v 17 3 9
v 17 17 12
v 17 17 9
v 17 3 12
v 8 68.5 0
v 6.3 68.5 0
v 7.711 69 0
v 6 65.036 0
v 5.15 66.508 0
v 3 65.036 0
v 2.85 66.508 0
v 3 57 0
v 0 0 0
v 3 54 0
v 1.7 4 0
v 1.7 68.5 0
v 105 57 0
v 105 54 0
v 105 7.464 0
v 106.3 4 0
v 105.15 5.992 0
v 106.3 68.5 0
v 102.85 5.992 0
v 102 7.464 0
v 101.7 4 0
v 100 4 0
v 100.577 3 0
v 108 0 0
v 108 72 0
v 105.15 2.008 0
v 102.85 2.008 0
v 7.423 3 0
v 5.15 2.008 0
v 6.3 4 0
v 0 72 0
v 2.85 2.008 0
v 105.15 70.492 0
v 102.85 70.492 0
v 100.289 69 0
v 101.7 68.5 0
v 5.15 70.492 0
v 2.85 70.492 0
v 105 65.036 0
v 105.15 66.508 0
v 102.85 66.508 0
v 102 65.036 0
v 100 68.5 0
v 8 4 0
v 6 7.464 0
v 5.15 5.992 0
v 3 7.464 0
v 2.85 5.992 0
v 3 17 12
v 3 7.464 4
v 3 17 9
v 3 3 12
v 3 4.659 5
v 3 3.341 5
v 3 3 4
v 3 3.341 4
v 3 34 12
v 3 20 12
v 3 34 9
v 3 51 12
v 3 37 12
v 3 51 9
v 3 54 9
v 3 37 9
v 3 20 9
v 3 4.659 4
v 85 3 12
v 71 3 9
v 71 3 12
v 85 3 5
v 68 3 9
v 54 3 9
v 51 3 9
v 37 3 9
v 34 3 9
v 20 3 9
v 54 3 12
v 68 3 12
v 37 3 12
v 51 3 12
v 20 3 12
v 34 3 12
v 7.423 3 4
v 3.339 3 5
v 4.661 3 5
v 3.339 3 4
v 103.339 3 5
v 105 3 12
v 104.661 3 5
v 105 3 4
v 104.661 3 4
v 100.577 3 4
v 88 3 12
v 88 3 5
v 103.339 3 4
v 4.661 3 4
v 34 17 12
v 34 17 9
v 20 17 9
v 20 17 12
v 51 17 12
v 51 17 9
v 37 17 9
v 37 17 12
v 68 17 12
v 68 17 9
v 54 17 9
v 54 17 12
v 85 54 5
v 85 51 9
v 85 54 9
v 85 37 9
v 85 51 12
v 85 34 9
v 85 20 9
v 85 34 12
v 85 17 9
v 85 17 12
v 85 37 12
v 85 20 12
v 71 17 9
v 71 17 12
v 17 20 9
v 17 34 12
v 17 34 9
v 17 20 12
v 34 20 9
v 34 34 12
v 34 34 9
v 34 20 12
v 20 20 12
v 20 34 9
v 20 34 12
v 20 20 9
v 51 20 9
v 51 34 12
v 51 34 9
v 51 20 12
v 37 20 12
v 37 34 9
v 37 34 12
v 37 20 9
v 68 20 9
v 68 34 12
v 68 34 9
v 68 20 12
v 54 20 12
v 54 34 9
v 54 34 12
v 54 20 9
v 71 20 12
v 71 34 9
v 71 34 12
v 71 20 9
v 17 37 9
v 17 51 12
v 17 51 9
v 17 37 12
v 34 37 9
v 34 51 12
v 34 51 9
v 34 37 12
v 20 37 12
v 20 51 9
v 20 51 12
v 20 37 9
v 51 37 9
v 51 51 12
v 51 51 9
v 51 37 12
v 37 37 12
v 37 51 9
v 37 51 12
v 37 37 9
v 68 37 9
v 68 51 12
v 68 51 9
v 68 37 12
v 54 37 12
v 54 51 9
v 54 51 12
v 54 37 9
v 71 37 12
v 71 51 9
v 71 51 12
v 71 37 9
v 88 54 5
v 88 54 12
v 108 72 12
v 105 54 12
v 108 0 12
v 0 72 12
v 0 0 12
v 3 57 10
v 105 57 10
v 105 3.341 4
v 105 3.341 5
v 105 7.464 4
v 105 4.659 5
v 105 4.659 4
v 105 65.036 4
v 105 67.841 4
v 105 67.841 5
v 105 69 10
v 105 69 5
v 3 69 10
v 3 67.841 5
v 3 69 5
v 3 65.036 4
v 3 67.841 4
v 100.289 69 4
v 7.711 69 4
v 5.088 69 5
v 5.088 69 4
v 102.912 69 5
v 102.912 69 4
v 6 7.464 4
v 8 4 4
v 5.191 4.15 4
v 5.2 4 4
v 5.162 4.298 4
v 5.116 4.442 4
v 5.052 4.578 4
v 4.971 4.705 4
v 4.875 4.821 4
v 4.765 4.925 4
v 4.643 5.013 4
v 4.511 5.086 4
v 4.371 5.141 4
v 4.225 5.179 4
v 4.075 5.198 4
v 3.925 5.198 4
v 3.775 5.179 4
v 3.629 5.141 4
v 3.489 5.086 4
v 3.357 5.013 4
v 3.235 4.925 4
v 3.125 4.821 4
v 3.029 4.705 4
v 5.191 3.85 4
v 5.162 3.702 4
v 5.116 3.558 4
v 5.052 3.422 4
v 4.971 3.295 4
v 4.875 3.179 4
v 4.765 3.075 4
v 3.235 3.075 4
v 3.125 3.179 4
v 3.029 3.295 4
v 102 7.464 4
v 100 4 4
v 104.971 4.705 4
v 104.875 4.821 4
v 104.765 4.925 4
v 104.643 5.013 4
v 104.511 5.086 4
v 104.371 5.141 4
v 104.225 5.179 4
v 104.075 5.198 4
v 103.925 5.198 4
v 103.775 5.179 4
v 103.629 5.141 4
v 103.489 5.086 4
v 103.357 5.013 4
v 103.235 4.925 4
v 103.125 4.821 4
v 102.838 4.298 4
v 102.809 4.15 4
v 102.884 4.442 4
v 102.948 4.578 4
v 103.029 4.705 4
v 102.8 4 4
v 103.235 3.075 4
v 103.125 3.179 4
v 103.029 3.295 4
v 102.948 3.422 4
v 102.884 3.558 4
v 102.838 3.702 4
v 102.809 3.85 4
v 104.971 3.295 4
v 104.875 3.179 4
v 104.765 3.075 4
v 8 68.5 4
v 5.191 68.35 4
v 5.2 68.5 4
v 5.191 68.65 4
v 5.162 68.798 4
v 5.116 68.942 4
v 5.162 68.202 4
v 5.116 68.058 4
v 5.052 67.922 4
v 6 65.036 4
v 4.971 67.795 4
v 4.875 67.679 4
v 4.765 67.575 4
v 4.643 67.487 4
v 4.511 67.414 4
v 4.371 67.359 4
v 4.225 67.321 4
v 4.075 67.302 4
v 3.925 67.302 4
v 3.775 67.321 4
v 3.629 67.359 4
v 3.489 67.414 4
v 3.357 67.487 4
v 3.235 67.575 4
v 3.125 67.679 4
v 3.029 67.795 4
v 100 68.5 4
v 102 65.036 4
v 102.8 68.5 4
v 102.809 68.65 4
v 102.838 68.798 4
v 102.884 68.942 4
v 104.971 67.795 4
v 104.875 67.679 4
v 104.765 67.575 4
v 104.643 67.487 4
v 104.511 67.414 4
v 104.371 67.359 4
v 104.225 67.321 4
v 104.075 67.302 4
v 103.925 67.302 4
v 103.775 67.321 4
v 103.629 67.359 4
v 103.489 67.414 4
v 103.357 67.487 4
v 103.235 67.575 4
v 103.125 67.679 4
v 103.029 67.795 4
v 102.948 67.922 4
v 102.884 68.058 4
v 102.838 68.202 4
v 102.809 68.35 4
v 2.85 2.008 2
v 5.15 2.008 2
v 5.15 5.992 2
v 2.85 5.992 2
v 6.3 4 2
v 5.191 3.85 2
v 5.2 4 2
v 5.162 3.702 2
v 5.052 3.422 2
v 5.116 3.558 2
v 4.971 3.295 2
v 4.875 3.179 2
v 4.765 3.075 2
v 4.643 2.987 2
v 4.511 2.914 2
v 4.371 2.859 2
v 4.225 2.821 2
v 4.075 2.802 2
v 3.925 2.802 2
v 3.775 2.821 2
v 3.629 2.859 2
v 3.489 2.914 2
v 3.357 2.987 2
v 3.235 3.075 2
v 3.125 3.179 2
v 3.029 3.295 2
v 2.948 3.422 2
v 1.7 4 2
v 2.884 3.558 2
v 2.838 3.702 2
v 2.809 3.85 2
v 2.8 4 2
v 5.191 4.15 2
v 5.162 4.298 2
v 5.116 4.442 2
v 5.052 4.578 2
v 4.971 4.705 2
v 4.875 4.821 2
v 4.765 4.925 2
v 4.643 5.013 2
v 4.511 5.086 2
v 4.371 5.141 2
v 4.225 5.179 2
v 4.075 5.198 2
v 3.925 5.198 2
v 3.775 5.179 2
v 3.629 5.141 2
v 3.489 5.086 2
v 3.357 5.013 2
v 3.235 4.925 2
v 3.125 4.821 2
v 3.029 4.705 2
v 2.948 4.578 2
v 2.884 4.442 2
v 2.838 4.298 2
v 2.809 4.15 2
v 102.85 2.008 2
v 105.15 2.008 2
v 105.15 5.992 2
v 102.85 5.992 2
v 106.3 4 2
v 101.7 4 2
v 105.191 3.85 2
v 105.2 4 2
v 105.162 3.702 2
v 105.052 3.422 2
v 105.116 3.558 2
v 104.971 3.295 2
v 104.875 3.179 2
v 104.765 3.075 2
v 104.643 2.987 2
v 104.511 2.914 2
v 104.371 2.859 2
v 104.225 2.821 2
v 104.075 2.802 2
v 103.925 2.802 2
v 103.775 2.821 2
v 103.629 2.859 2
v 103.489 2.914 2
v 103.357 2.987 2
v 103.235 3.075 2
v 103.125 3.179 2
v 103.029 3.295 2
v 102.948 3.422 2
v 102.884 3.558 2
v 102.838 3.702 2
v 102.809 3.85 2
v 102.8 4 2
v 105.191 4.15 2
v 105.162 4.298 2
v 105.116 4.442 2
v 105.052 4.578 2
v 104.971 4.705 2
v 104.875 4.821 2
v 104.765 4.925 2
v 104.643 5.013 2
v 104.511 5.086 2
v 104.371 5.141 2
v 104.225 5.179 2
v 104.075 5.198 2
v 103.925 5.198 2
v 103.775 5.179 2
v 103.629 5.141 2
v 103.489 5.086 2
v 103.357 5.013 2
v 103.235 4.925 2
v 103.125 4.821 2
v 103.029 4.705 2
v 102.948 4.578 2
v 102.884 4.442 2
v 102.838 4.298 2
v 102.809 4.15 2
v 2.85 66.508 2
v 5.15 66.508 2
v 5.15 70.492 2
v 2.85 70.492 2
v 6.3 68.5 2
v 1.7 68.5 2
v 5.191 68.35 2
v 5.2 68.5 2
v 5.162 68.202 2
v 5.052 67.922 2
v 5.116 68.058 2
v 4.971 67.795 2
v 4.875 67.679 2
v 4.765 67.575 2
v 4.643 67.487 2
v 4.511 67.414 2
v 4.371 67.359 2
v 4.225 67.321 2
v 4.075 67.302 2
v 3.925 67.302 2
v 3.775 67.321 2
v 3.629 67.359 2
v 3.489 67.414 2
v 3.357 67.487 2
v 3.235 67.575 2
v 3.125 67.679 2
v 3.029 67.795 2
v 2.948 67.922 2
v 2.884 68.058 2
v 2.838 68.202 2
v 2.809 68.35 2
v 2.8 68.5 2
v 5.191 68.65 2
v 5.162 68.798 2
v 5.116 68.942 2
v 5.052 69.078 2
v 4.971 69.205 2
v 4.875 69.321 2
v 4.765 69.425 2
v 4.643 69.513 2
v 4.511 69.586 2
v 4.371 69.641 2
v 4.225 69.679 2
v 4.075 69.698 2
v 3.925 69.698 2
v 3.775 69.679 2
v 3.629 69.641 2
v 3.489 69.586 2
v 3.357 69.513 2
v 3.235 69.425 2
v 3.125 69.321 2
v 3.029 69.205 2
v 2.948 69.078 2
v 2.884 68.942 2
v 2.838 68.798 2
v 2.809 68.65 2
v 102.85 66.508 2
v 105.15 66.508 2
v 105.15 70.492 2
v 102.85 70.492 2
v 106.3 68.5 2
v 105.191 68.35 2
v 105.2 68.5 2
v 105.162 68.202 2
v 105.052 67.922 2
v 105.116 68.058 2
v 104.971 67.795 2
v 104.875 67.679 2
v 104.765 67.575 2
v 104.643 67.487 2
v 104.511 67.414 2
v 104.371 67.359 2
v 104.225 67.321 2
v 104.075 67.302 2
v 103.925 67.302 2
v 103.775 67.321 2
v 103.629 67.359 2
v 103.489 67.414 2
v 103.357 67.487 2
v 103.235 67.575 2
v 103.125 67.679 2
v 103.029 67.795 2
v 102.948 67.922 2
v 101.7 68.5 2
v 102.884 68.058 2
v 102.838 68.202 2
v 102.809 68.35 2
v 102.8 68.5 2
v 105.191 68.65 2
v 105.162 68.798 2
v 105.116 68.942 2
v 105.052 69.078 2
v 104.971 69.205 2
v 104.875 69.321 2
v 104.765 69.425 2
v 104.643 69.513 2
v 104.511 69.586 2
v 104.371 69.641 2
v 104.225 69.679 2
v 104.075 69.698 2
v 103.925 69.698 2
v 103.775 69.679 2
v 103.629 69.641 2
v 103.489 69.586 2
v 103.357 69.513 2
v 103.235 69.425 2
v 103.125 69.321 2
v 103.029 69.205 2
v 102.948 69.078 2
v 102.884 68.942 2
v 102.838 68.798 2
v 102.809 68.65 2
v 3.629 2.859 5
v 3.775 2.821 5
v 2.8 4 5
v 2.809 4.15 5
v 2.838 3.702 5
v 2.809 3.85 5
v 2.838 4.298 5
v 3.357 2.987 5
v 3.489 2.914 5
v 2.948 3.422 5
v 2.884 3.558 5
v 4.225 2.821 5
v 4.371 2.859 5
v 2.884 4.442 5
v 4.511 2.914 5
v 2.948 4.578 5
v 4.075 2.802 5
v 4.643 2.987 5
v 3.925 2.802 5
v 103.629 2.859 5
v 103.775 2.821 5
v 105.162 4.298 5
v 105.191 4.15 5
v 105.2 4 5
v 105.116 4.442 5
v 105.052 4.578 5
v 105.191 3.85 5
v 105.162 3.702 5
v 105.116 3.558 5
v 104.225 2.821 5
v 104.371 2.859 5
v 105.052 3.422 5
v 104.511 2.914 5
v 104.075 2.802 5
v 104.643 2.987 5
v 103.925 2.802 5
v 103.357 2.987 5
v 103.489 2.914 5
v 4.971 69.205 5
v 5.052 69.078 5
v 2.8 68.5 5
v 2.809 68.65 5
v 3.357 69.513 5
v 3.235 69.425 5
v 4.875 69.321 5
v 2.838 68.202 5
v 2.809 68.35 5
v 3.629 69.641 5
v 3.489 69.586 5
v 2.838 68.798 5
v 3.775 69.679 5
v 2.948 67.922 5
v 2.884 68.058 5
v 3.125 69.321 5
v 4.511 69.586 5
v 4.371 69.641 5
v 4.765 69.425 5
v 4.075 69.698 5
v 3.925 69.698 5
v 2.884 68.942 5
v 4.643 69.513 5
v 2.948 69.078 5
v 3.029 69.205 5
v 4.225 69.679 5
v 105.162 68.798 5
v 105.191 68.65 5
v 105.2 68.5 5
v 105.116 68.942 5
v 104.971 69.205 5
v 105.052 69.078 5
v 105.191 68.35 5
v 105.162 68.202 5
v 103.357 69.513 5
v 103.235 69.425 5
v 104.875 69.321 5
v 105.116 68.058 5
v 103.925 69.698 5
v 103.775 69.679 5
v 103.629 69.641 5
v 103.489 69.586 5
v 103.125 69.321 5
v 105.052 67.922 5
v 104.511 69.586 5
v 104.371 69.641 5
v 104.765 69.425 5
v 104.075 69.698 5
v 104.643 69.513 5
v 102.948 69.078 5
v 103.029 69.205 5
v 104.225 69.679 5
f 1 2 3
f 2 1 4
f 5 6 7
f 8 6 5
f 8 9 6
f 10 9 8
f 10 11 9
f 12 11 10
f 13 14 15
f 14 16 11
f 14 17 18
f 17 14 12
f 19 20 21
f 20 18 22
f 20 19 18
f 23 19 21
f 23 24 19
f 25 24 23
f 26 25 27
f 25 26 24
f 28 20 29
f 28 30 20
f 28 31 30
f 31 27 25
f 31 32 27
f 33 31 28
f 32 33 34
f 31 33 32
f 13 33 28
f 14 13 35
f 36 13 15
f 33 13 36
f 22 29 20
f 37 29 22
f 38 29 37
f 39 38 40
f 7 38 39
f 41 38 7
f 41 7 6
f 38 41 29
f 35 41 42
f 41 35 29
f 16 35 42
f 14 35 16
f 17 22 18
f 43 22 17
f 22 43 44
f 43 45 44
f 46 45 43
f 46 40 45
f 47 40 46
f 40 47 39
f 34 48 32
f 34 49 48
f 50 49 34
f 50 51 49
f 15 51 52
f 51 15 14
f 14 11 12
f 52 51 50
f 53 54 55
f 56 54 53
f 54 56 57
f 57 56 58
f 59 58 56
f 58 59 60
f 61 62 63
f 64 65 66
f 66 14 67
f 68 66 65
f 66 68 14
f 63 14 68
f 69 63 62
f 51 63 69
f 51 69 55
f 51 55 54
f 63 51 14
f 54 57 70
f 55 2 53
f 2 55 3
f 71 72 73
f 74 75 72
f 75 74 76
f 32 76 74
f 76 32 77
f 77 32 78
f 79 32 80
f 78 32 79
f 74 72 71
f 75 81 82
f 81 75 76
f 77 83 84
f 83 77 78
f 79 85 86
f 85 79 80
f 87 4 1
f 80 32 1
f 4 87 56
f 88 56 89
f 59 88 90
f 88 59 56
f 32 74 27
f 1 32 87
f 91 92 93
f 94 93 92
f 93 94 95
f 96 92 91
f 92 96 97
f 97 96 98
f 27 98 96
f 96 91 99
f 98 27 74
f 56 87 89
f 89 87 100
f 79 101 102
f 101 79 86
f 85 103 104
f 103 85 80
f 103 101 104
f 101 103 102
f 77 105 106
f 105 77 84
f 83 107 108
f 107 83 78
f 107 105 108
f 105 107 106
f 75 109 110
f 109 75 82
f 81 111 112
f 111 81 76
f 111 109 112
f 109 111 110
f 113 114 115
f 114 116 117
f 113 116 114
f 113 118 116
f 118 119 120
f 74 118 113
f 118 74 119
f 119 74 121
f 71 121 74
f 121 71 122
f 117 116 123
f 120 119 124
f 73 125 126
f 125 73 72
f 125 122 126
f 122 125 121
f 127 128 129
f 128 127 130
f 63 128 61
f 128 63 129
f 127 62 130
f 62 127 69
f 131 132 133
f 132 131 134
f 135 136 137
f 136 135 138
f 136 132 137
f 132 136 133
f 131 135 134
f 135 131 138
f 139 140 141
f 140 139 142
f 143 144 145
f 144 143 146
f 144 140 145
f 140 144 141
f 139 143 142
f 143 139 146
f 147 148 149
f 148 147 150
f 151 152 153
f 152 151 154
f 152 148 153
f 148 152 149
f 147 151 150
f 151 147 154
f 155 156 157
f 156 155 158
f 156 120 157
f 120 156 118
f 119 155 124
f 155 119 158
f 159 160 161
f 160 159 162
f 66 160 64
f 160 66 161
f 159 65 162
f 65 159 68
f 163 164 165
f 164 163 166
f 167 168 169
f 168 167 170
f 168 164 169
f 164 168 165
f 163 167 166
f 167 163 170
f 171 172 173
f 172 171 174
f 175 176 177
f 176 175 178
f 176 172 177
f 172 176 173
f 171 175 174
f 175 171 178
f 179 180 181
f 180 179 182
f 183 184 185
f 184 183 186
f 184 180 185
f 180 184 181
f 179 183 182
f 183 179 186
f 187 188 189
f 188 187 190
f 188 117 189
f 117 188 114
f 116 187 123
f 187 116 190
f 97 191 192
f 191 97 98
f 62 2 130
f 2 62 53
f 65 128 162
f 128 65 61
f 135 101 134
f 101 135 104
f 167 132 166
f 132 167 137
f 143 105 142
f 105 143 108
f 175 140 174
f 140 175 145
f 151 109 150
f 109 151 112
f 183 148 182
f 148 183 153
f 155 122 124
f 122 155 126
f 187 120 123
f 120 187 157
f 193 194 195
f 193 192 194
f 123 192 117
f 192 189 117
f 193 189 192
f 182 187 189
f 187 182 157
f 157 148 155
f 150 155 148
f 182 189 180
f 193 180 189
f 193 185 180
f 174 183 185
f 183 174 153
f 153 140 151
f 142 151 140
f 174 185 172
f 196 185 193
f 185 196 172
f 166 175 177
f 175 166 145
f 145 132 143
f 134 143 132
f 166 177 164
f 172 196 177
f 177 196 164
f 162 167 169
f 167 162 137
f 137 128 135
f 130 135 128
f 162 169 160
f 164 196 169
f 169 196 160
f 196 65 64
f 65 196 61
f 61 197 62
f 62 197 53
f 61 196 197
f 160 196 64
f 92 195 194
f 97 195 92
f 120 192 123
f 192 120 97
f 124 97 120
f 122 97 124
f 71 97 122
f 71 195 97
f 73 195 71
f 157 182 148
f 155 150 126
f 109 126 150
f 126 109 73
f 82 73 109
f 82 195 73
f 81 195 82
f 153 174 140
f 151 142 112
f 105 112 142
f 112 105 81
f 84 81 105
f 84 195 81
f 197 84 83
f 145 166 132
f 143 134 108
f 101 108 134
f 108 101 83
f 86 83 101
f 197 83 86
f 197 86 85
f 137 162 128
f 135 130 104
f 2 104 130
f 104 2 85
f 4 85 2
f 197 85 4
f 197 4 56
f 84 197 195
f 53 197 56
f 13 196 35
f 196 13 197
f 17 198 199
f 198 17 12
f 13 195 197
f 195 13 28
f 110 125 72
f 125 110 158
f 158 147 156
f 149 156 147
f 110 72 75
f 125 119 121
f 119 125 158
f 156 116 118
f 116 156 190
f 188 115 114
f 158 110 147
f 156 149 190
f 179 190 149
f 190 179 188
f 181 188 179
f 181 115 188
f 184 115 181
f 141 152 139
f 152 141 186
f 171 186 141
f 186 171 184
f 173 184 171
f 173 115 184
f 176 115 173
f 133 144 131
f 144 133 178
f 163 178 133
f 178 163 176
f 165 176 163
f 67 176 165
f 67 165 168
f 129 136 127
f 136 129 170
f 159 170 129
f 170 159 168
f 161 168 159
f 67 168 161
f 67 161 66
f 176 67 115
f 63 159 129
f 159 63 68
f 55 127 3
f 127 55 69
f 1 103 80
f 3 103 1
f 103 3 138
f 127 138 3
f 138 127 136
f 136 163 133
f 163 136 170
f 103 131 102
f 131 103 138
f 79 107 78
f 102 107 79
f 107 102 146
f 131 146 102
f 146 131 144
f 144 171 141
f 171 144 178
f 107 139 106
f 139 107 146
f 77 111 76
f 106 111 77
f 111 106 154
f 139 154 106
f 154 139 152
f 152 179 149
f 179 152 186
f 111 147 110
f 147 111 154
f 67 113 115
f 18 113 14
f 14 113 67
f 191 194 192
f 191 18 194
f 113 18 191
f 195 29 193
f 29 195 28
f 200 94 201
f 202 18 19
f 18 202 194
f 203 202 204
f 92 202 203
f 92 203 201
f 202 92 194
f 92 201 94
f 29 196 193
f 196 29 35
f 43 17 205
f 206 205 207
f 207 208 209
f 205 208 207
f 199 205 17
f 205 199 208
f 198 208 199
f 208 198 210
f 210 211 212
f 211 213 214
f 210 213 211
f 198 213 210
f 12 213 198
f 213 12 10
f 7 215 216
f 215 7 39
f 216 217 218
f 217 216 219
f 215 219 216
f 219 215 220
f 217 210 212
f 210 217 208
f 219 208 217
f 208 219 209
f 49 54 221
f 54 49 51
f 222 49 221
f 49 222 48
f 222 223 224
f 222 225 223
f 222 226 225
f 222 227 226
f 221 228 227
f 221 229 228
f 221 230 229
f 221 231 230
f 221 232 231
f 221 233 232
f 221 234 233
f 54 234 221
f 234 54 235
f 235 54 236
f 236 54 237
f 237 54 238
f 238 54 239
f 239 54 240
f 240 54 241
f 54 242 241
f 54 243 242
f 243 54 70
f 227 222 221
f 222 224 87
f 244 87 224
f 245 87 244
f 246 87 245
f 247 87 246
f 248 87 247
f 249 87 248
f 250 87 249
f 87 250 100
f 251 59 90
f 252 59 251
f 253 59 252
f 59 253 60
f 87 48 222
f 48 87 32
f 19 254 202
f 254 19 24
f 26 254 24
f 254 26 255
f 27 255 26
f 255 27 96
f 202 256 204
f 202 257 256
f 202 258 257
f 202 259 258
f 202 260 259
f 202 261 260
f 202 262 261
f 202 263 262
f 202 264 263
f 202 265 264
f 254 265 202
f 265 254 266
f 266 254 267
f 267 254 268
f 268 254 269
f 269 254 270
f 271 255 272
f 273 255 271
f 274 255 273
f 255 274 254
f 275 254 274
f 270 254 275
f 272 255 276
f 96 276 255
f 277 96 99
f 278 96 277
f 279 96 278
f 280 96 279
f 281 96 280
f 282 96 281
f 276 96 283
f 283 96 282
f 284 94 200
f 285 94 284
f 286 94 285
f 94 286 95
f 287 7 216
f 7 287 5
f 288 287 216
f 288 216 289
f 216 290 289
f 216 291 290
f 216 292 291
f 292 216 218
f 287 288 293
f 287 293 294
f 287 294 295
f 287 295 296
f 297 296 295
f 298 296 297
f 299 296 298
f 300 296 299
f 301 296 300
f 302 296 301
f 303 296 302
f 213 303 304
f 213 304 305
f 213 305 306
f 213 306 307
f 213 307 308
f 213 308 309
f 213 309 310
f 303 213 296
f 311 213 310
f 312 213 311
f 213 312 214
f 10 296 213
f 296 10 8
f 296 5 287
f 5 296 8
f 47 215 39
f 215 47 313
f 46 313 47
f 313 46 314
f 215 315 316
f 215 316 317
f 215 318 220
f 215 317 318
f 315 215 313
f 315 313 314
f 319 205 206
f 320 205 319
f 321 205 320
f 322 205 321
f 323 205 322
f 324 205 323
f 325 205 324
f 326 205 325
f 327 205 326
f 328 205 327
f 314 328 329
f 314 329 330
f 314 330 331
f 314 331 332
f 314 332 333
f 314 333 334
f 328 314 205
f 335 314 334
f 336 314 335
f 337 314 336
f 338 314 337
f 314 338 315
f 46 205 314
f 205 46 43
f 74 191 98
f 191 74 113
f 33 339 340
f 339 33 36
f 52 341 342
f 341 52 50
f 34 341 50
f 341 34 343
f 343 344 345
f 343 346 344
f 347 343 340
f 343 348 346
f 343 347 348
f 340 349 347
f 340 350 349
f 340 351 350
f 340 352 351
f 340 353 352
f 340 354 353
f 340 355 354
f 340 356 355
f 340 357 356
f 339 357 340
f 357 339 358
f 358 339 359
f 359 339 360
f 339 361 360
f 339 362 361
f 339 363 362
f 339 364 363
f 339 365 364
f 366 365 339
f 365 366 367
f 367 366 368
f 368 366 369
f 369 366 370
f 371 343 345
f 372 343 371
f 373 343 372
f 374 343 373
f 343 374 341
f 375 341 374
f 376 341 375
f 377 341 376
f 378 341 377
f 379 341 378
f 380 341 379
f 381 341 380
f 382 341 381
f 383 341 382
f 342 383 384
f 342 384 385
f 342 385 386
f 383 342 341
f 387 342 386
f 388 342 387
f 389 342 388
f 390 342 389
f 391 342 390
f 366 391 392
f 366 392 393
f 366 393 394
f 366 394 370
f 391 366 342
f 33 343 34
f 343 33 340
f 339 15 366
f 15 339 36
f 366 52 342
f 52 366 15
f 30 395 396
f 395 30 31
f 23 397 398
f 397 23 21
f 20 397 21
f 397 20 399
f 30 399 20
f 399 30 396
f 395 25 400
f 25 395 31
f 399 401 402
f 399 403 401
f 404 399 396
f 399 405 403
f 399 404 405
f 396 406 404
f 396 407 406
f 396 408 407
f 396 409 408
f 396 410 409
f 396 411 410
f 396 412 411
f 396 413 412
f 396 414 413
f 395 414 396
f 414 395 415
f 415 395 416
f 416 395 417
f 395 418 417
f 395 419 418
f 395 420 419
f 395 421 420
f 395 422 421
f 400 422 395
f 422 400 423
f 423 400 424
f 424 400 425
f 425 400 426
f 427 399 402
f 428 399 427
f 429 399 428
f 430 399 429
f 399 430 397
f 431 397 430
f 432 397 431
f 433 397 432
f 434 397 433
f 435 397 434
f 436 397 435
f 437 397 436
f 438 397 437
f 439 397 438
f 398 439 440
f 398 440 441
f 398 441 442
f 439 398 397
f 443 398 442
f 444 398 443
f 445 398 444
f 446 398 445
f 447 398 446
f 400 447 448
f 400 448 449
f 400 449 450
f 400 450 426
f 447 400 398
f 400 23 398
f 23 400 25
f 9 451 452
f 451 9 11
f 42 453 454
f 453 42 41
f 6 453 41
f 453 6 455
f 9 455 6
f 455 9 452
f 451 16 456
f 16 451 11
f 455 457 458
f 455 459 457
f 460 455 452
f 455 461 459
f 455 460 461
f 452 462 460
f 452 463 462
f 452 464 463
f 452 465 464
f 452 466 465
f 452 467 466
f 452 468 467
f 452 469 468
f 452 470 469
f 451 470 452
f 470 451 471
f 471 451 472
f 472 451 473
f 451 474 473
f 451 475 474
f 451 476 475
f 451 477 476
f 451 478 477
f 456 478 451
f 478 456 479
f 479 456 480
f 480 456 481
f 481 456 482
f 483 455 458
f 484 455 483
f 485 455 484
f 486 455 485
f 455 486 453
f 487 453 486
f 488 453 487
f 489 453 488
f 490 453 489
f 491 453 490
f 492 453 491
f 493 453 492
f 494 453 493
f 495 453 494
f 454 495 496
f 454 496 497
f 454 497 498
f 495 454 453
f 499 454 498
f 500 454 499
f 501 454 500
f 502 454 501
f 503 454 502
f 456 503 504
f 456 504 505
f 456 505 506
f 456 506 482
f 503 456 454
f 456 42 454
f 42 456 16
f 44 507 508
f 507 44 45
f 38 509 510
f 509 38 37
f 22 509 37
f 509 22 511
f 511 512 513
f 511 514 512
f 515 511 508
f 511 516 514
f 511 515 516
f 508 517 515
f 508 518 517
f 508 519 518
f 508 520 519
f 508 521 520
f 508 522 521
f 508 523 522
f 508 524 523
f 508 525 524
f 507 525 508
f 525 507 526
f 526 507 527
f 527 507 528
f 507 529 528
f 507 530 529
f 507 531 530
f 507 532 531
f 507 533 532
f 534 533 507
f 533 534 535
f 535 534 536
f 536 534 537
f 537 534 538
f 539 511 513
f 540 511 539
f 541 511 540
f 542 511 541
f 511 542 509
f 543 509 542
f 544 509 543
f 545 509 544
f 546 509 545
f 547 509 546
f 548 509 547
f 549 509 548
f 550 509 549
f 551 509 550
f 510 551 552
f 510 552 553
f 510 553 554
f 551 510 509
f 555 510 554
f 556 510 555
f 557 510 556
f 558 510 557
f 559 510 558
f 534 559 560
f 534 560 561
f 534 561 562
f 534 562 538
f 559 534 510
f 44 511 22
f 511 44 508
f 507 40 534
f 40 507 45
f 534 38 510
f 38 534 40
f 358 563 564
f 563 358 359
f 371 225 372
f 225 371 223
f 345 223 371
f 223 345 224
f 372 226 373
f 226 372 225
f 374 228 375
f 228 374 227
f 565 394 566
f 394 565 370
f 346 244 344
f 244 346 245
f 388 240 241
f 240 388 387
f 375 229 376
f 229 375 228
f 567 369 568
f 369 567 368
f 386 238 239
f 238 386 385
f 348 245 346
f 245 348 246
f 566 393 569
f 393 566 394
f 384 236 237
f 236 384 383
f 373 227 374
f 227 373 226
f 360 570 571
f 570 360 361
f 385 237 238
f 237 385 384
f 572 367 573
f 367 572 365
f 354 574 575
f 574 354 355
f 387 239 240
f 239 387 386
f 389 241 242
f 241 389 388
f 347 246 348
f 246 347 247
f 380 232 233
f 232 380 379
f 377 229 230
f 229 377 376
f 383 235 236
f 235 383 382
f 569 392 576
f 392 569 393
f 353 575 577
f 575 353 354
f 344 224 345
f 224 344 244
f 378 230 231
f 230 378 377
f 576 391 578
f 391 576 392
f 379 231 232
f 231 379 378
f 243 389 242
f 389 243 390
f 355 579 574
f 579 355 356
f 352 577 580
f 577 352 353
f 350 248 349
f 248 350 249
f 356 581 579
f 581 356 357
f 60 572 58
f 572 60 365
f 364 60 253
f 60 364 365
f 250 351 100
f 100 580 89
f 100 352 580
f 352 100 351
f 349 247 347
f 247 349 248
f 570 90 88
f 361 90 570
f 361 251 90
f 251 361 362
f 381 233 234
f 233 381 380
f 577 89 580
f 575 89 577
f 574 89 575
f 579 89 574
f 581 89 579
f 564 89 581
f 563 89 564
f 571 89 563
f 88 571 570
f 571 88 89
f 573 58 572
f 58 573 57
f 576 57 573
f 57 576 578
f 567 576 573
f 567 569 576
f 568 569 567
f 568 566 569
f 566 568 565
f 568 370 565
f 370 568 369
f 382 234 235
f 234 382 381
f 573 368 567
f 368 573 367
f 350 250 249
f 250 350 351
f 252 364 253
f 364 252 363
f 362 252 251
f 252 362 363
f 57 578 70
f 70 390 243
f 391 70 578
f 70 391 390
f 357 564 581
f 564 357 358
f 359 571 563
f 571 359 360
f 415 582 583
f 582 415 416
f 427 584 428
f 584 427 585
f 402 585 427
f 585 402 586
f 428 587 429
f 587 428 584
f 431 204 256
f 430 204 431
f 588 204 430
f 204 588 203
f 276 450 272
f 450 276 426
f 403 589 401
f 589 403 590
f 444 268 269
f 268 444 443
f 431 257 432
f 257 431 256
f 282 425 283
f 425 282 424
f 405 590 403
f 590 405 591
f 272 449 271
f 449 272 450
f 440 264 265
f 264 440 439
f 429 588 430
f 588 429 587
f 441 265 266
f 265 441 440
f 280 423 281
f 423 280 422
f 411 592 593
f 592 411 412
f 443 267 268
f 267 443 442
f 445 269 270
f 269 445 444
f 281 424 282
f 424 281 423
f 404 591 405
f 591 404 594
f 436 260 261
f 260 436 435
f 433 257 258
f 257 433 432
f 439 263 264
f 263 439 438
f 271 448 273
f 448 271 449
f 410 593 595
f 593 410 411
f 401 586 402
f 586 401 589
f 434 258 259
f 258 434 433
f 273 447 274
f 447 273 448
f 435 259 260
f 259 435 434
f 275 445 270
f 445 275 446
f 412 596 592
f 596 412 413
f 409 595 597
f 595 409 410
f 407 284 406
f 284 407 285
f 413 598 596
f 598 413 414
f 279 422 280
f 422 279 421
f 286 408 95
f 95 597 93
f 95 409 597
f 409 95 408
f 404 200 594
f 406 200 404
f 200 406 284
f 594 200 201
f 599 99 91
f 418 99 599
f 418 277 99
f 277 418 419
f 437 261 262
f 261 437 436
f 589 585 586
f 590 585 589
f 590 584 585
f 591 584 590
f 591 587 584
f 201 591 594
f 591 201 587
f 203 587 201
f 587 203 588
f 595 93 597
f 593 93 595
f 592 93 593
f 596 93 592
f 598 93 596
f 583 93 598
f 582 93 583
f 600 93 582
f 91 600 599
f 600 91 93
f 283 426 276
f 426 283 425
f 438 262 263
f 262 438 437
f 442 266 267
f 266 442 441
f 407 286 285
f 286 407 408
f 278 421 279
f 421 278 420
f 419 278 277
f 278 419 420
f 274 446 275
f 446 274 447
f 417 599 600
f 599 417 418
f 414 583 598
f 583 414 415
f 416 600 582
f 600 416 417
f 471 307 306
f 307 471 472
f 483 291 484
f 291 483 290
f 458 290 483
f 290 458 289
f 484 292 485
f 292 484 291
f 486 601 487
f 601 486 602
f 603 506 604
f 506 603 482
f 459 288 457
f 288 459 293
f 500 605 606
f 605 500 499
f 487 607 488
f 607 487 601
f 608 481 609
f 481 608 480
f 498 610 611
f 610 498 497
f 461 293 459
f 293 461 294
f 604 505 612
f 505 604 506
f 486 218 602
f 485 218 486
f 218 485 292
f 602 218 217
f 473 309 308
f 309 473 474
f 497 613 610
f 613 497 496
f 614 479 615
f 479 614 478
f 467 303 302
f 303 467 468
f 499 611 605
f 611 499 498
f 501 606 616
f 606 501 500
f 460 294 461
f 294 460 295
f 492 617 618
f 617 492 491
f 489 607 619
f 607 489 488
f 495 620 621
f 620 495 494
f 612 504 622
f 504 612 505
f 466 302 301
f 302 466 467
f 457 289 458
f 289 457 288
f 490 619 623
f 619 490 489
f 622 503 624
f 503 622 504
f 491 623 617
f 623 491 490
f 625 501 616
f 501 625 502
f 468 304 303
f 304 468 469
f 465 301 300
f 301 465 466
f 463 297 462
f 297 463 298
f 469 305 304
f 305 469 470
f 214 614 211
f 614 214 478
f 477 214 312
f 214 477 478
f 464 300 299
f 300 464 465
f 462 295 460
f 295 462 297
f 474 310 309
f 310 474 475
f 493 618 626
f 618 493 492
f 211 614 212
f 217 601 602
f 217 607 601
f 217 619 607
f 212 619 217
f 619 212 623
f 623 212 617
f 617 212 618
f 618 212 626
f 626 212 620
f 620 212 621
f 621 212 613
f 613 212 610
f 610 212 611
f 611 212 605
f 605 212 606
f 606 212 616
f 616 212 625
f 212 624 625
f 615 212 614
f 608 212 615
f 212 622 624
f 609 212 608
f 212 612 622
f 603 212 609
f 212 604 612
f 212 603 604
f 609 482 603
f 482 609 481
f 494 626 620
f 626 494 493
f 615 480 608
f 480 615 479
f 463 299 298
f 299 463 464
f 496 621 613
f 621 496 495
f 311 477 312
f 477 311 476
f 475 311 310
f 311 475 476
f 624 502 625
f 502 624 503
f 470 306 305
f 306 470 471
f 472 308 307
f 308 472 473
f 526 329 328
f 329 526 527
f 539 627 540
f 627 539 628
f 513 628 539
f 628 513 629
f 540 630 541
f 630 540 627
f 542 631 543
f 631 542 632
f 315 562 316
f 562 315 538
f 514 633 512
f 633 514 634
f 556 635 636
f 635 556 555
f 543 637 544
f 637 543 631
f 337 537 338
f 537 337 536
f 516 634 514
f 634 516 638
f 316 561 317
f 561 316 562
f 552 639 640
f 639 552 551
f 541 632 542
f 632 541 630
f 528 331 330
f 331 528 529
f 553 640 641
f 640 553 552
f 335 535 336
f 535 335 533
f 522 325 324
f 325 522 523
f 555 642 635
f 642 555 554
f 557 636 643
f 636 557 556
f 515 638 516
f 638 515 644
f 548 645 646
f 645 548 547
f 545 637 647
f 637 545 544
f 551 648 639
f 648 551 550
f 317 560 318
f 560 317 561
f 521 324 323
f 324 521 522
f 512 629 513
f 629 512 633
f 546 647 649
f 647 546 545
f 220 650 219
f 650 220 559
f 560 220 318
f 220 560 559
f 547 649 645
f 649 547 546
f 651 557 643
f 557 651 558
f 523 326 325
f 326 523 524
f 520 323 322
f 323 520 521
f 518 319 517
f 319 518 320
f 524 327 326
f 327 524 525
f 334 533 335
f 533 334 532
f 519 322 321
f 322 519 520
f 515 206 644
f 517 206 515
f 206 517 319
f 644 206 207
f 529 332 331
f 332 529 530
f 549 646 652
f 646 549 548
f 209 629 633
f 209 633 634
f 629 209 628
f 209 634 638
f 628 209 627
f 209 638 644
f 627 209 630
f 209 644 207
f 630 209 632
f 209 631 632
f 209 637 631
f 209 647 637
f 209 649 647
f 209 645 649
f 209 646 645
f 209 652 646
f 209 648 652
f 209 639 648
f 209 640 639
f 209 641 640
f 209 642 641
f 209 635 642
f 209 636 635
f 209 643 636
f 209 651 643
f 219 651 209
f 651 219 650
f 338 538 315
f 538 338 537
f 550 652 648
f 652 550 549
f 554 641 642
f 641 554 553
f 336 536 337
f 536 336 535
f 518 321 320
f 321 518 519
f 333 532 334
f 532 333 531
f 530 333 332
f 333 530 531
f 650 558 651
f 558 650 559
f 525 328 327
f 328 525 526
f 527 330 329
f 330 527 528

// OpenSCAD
hole_cube_width = 14;
hole_distance = 3;

number_of_rows = 3;
number_of_columns = 5;

keyboard_width = hole_distance + (hole_cube_width + hole_distance)*number_of_columns;
keyboard_depth = hole_distance + (hole_cube_width + hole_distance)*number_of_rows;
keyboard_height = 12;

chip_width = 23;
chip_depth = 51;
chip_shell_width = chip_width - hole_distance;
chip_shell_depth = chip_depth + hole_distance;
chip_shell_height = keyboard_height;

battery_shell_depth = keyboard_height;

screw_hole_radius = 1.2;
nut_hole_radius = 2.3;
nut_hole_mesh_radius = 4;
screw_center_locations = [
    [nut_hole_mesh_radius, nut_hole_mesh_radius, 0],
    [keyboard_width+chip_shell_width-nut_hole_mesh_radius, nut_hole_mesh_radius, 0],
    [nut_hole_mesh_radius, keyboard_depth+battery_shell_depth+nut_hole_mesh_radius-(hole_distance/2), 0],
    [keyboard_width+chip_shell_width-nut_hole_mesh_radius, keyboard_depth+battery_shell_depth+nut_hole_mesh_radius-(hole_distance/2), 0]
];

// keyboard part
module holes_row(row, start, end) {
    hole_positions = [
        for (x=[start:(number_of_columns-1-end)]) [
            x*hole_cube_width + x*hole_distance,
            (row * (hole_distance + hole_cube_width)),
            0
        ]
    ];

    for (hole_position=hole_positions)
        translate(hole_position) {
            cube([hole_cube_width, hole_cube_width, 20]);
        };
};

module holes_grid() {
    translate([hole_distance, (-hole_cube_width), 0]) {
        holes_row(1, 0, 0);
        holes_row(2, 0, 0);
        holes_row(3, 0, 0);
    };
};

module body_mesh() {
    cube([keyboard_width, keyboard_depth+hole_distance, keyboard_height]);
};

module body_mesh_cutout() {
    difference() {
        body_mesh();
        holes_grid();
    }
};

module keyboard_shell() {
    difference() {
        body_mesh_cutout();
        translate([hole_distance, hole_distance, -1]) cube([keyboard_width-(2*hole_distance), keyboard_depth-(1*hole_distance), keyboard_height-2]);
    }
};


// chip part
module chip_body_mesh() {
    translate([keyboard_width, 0, 0]) {
        cube([chip_shell_width, chip_shell_depth+hole_distance, chip_shell_height]);
    };
};

module main_keyboard_shell_hole() {
    translate([keyboard_width-(2*hole_distance), hole_distance, -1]) cube([chip_width, chip_depth, 2*chip_shell_height]);    
};

module chip_shell() {
    difference() {
        chip_body_mesh();
        main_keyboard_shell_hole();
    };
};

module chip_and_keyboard_connection_hole() {
    translate([3*hole_distance, hole_distance, -5]) cube([keyboard_width-(2*hole_distance), keyboard_depth-(1*hole_distance), keyboard_height-2]);
};

// battery case on the front
module battery_shell_hole() {
    translate([hole_distance, keyboard_depth + hole_distance, -2]) cube([keyboard_width+chip_shell_width-(2*hole_distance), battery_shell_depth, keyboard_height]);
};

module battery_body_mesh() {
    translate([0, keyboard_depth + hole_distance, 0]) cube([keyboard_width+chip_shell_width, battery_shell_depth+hole_distance, keyboard_height]);
};

module battery_shell() {
    difference() {
        battery_body_mesh();
        battery_shell_hole();
    };
};

module screw_hole_meshes() {
    for (screw_center=screw_center_locations) {
        translate(screw_center) {
            cylinder(h=4, r=nut_hole_mesh_radius, $fn=6);
        };
    };
};

module chip_keyboard_and_battery_shell() {
    union() {
        keyboard_shell();
        chip_shell();
        battery_shell();
        screw_hole_meshes();
    };
};

// gpio socket
// screw holes
module screw_holes() {
    for (screw_center=screw_center_locations) {
        translate(screw_center) {
            translate([0, 0, -1]) {
                cylinder(h=3, r=nut_hole_radius, $fn=6);
            };
        };
    };
    for (screw_center=screw_center_locations) {
        translate(screw_center) {
            translate([0, 0, -1]) {
                cylinder(h=6, r=screw_hole_radius, $fn=50);
            };
        };
    };

};

// bottom with wiring


// main
module keyboard() {
    difference() {
        difference() {
            chip_keyboard_and_battery_shell();
            chip_and_keyboard_connection_hole();
        };
        screw_holes();
    };
};

translate([0, 0, 0]) {
    keyboard();
};
